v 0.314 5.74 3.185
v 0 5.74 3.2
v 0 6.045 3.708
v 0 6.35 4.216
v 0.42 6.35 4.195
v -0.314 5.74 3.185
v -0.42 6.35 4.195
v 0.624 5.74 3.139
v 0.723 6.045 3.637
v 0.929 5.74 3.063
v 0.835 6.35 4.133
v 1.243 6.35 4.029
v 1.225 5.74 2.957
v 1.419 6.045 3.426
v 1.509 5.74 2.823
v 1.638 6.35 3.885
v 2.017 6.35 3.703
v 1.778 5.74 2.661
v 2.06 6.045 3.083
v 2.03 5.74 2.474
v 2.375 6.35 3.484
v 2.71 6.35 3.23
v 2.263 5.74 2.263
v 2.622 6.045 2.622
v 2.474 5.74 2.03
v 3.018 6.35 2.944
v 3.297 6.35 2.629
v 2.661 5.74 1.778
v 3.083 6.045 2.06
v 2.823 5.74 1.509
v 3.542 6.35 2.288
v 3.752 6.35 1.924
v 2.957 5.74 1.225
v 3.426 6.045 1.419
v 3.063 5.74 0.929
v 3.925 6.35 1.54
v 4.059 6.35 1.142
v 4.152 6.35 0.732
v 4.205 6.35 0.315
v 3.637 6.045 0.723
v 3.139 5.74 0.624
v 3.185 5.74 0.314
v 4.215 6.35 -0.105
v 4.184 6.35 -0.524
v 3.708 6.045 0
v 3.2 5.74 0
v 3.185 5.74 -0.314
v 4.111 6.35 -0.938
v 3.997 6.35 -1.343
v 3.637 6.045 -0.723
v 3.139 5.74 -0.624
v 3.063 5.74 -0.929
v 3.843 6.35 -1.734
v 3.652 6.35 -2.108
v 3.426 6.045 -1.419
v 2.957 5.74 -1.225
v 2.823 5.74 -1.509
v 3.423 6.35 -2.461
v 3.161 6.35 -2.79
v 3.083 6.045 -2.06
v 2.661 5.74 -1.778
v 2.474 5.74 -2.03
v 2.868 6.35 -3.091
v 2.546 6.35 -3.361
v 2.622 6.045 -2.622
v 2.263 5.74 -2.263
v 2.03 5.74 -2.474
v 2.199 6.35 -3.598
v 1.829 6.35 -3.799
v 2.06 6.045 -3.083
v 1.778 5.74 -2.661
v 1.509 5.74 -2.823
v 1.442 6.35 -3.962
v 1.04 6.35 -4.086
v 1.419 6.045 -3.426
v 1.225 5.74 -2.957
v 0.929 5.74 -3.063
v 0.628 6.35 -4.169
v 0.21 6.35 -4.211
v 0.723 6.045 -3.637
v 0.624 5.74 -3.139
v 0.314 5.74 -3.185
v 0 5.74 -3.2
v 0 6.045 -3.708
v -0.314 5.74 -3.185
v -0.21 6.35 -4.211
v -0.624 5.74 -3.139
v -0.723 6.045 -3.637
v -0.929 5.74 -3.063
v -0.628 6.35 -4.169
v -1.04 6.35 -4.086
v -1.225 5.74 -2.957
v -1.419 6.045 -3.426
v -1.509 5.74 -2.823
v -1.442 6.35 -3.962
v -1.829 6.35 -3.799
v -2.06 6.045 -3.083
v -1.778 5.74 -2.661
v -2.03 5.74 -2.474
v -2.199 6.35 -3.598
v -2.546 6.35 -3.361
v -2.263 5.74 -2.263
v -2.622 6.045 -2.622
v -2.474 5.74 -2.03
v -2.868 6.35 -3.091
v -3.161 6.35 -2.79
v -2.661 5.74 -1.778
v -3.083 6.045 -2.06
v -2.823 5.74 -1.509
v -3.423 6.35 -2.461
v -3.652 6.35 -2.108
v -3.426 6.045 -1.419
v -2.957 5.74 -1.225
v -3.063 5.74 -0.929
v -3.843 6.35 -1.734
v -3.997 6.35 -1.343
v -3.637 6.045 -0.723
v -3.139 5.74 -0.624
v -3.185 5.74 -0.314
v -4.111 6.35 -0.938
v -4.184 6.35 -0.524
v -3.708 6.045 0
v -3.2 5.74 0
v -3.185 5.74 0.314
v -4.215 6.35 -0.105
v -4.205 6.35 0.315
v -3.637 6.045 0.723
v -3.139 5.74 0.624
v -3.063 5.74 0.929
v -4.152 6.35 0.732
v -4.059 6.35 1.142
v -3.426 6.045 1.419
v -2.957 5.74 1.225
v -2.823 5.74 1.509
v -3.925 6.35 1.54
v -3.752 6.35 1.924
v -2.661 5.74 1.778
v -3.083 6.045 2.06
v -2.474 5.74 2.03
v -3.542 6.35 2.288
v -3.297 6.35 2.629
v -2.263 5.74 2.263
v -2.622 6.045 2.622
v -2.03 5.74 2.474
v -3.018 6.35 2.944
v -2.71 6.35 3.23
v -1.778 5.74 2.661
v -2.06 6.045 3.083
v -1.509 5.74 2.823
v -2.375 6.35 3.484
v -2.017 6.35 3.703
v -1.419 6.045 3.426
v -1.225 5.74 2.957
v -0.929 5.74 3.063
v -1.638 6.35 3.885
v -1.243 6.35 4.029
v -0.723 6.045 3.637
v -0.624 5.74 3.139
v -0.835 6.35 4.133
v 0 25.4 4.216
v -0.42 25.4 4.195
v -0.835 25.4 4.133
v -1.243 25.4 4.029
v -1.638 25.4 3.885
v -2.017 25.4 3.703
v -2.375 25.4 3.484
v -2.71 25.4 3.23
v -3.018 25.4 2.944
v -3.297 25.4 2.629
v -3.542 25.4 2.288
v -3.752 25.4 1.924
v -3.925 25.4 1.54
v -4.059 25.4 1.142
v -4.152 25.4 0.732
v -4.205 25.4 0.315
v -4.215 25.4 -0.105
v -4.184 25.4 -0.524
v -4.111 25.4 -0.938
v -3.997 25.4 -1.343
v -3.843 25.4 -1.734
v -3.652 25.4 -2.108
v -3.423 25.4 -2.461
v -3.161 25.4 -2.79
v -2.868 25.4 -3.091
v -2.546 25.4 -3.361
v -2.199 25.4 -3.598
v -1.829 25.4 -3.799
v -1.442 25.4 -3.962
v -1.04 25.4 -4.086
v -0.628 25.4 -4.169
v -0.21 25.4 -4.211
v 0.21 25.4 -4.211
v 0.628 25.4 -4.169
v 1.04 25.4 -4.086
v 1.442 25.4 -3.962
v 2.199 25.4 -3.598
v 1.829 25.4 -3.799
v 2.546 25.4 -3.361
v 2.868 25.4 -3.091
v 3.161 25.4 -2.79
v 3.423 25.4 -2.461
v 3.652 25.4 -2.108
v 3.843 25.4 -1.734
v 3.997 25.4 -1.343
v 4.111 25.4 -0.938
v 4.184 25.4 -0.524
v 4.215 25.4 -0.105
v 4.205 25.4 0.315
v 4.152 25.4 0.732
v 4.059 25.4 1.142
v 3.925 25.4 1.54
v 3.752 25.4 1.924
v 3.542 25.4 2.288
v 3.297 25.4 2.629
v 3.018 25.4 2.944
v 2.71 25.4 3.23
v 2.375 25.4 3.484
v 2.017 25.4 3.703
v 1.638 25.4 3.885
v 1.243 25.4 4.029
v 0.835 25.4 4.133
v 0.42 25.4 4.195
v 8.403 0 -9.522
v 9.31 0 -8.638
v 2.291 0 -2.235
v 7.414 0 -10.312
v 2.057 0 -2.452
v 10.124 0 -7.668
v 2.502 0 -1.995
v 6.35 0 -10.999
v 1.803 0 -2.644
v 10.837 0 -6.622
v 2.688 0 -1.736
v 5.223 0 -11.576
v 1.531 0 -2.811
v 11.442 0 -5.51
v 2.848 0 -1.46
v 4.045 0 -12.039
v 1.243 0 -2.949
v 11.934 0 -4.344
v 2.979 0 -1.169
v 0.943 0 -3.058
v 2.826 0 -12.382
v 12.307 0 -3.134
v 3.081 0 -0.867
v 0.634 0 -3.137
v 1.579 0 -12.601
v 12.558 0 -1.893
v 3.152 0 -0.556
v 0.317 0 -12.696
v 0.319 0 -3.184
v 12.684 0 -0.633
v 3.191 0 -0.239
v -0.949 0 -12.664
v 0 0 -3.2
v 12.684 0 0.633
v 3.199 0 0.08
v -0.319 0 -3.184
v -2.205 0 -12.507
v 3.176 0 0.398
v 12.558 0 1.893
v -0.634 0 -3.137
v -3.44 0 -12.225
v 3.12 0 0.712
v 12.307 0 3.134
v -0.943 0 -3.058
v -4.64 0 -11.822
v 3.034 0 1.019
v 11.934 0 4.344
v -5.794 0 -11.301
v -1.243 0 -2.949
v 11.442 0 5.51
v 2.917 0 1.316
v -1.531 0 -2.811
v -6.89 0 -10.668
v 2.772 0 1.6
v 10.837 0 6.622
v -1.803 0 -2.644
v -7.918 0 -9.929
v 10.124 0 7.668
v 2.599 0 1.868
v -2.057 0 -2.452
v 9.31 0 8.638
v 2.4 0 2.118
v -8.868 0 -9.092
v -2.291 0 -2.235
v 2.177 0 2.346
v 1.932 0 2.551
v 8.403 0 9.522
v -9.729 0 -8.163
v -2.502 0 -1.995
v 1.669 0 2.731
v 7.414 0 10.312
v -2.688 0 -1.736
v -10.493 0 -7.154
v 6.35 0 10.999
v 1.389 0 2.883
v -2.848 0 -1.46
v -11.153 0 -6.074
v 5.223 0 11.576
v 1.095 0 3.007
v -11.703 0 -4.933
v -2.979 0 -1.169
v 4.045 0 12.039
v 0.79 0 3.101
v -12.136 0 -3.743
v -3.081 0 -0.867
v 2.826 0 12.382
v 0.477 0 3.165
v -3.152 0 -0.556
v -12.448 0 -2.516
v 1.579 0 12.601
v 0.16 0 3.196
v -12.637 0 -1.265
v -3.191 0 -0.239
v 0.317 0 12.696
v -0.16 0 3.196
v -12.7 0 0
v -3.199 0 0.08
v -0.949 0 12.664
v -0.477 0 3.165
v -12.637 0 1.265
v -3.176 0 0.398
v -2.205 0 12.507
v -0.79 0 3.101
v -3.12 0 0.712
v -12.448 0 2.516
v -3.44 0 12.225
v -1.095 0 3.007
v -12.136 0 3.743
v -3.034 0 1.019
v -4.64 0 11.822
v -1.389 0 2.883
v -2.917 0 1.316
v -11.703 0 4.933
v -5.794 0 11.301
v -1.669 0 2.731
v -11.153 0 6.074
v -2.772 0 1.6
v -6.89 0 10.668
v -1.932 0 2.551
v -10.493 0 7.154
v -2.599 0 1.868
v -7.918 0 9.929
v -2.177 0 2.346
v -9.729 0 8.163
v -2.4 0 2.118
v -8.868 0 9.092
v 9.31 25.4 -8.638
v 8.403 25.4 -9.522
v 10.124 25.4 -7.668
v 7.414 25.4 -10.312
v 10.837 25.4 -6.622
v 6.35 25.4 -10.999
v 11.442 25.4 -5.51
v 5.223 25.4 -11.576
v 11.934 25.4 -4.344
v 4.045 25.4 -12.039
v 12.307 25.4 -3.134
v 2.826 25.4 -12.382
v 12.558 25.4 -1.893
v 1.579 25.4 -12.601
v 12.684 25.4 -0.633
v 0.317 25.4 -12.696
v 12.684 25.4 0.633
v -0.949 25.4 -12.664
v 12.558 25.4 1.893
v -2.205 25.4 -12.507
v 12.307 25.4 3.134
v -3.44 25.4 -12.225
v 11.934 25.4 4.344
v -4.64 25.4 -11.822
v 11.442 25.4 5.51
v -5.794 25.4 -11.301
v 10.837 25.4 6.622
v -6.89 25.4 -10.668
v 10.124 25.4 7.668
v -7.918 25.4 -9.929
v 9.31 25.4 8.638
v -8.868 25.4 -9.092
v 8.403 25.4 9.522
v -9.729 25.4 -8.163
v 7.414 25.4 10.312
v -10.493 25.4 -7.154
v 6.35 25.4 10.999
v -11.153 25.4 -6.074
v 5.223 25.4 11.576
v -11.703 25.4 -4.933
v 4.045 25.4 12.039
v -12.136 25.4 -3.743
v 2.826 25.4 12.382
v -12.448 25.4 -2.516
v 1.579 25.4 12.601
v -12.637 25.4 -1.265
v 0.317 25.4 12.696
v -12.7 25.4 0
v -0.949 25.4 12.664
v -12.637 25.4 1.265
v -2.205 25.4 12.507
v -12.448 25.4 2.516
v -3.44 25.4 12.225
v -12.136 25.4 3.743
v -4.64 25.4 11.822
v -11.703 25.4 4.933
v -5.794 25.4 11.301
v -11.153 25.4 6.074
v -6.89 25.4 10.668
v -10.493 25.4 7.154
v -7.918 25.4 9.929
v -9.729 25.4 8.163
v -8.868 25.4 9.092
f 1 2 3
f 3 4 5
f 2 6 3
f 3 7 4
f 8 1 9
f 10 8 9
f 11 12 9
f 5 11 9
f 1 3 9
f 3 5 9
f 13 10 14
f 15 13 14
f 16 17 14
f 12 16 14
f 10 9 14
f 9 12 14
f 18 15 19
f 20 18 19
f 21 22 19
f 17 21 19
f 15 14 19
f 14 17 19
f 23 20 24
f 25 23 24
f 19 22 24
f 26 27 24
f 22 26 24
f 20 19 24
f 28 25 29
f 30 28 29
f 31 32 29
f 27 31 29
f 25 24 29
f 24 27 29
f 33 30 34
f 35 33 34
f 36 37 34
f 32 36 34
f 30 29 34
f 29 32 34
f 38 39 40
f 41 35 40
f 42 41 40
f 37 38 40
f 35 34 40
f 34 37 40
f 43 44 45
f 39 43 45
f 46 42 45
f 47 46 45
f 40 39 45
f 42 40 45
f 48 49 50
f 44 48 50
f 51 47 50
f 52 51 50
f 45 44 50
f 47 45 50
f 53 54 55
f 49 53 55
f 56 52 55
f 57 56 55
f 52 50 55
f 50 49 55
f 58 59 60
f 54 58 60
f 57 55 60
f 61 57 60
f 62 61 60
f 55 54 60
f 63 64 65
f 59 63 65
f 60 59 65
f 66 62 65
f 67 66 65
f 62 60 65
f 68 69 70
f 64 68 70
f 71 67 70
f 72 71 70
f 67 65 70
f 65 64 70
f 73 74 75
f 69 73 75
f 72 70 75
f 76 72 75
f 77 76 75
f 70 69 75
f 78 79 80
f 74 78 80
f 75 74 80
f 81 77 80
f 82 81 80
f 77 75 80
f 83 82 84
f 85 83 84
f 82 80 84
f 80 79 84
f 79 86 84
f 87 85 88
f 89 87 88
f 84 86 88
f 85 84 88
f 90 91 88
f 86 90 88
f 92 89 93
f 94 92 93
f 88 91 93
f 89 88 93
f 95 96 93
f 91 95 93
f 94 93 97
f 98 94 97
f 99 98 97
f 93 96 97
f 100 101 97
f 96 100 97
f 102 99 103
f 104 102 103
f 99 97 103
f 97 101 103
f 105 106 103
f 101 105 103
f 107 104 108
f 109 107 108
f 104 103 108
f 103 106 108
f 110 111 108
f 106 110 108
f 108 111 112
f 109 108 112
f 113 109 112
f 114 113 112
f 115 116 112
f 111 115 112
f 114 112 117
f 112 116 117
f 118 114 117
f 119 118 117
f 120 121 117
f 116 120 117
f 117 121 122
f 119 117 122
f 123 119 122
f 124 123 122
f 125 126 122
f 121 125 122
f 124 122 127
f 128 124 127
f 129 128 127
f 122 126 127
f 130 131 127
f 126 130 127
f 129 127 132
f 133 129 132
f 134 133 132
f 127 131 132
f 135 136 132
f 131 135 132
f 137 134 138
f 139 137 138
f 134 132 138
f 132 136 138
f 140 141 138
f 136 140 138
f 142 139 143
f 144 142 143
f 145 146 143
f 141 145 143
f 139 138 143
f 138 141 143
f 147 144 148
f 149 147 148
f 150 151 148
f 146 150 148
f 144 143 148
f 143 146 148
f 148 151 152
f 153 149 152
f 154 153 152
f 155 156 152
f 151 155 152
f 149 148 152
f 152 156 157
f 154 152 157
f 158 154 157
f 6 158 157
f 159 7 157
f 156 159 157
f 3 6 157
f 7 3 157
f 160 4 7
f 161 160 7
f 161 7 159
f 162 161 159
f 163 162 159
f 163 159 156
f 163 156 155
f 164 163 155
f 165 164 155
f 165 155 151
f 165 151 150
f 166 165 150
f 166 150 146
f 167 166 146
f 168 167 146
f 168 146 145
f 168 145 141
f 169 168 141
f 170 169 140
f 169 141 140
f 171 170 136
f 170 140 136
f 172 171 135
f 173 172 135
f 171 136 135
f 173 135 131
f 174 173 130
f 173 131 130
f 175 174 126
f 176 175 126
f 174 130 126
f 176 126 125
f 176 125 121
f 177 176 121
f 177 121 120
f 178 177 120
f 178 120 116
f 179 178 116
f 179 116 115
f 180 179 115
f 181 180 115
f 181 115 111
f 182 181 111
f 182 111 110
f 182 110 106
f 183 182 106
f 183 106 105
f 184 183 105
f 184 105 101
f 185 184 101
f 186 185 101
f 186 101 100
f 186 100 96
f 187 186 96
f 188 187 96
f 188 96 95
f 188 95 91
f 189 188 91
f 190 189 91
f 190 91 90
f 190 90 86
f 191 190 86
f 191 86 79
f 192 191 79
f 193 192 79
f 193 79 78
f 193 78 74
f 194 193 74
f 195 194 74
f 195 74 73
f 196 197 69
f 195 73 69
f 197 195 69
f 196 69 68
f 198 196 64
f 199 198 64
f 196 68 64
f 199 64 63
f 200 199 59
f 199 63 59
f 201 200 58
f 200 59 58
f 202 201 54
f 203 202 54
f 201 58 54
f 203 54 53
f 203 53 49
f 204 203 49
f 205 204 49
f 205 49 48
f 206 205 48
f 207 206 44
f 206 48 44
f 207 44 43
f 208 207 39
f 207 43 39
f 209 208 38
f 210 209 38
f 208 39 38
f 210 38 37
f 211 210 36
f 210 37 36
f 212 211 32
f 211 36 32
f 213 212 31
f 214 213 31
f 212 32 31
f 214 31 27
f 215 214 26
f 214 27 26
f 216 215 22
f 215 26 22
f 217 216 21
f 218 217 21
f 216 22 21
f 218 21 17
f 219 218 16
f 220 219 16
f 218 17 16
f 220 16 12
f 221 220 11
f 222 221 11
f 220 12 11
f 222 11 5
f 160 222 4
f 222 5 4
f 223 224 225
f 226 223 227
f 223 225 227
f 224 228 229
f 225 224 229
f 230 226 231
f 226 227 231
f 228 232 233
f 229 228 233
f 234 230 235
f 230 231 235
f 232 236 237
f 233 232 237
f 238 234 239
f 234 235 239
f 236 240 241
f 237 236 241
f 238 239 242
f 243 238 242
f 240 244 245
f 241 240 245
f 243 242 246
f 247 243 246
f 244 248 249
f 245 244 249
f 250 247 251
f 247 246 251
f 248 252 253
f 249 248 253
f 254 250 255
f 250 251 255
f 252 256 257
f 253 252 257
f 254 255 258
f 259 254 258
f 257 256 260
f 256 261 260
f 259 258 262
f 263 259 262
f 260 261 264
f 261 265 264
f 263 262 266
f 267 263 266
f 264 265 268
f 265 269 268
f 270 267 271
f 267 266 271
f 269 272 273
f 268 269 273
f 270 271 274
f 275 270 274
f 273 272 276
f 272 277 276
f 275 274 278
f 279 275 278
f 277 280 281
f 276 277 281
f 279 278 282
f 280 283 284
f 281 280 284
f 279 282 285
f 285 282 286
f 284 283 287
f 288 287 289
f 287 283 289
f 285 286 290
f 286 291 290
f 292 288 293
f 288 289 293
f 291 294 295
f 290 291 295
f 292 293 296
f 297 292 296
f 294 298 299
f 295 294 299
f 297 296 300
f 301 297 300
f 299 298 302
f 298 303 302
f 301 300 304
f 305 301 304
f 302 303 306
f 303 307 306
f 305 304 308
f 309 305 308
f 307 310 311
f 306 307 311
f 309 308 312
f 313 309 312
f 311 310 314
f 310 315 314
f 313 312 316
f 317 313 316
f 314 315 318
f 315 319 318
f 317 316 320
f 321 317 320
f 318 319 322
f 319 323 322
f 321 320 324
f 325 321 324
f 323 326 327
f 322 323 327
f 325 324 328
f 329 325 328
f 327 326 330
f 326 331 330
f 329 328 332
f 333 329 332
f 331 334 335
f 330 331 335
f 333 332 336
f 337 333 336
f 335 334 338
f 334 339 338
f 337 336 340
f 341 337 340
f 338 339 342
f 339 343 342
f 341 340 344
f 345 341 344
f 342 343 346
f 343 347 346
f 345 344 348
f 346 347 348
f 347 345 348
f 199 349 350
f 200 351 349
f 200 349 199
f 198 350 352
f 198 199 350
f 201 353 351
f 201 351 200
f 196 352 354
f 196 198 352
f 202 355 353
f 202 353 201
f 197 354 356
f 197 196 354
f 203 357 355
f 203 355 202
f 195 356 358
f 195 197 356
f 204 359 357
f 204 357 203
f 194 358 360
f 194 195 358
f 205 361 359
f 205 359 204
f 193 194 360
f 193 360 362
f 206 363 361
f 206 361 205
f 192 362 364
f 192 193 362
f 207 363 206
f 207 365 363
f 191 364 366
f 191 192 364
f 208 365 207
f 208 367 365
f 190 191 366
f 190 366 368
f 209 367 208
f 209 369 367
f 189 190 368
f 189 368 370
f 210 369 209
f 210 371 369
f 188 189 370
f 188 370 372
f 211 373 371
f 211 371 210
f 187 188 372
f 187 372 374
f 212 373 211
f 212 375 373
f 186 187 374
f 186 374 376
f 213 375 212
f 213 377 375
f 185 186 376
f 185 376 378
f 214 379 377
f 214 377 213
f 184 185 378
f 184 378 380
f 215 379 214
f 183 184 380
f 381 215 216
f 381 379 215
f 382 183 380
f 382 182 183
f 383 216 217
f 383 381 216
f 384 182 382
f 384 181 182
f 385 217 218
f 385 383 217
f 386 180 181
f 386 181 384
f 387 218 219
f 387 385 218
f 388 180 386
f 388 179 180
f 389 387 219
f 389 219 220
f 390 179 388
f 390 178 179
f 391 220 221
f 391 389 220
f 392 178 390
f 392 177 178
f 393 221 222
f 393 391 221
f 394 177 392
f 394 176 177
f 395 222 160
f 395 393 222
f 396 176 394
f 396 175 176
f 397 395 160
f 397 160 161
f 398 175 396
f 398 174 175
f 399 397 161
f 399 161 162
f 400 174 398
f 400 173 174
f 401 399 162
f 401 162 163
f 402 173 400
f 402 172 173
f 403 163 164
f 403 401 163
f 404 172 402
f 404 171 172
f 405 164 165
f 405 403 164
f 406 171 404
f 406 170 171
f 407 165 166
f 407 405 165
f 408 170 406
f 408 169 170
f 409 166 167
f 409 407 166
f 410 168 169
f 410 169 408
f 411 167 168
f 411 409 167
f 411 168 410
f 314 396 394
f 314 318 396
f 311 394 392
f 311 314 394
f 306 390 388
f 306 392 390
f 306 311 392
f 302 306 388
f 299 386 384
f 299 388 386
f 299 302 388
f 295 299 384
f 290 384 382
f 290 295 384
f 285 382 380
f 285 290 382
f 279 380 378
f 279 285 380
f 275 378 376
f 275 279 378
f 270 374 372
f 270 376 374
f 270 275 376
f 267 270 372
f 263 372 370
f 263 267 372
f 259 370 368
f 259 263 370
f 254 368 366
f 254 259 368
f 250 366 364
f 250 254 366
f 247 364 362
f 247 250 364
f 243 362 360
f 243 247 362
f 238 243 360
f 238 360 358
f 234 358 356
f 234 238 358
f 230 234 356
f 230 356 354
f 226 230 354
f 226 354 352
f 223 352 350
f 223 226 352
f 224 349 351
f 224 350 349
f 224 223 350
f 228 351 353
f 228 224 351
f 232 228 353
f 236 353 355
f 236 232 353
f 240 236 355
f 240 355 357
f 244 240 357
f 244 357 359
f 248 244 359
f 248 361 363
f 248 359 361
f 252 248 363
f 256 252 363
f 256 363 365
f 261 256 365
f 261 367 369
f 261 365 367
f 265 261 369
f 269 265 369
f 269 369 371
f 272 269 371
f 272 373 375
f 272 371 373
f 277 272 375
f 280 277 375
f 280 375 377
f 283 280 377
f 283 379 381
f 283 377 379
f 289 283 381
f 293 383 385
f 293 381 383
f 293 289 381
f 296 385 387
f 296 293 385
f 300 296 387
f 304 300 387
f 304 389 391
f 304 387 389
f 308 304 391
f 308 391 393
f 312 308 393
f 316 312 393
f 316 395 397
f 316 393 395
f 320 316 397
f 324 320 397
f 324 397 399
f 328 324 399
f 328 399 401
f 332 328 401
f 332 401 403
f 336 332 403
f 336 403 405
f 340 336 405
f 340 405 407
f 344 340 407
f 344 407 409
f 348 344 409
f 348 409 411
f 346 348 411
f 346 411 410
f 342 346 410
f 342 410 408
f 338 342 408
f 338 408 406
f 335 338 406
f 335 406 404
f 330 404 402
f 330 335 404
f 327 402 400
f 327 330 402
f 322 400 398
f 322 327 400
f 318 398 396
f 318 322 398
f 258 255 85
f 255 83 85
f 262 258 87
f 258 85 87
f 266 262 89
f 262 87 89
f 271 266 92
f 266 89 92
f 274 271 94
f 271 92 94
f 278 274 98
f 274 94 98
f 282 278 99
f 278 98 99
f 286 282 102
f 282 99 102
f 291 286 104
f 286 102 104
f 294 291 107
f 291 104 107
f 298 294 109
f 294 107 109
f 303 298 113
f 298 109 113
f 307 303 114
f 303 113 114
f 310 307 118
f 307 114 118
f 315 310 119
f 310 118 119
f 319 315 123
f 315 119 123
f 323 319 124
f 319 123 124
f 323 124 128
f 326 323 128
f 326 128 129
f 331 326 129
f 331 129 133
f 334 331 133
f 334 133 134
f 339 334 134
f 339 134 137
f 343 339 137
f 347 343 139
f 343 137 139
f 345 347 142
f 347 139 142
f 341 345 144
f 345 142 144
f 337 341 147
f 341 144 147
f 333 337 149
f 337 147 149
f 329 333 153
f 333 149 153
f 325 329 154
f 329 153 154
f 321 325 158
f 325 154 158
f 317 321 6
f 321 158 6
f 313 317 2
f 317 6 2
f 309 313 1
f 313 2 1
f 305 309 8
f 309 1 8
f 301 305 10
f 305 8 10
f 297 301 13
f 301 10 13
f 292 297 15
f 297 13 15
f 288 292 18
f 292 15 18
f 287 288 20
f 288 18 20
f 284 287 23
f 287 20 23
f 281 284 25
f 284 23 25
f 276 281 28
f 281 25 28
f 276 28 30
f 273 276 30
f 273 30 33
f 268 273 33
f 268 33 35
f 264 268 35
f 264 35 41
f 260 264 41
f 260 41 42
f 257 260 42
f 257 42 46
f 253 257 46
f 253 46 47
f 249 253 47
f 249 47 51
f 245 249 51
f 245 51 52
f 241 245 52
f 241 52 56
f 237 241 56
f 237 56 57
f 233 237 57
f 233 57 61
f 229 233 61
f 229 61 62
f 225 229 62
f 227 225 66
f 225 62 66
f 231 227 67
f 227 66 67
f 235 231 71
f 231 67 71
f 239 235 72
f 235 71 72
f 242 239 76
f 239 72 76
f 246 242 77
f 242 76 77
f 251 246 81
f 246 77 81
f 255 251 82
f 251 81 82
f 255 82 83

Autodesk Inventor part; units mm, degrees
ref_plane "YZ Plane" through (0, 0, 0) normal (1, 0, 0) x (0, 1, 0)
ref_plane "XZ Plane" through (0, 0, 0) normal (0, 1, 0) x (-1, 0, 0)
ref_plane "XY Plane" through (0, 0, 0) normal (0, 0, 1) x (1, 0, 0)
sketch "Sketch1" plane through (0, 0, 0) normal (0, 1, 0) x (-1, 0, 0)
  circle A0 centre (0, 0) radius 12.7
  dimension "d0" = 25.4
extrude "Extrusion1" add sketch "Sketch1" along normal blind 25.4
sketch "Sketch2" plane through (0, 25.4, 0) normal (0, 1, 0) x (1, 0, 0)
  circle A0 centre (0, 0) radius 2.4685
hole "Hole1" at (0, 25.4, 0) direction (0, -1, 0) diameter 8.4328 depth 19.05 tip angle 118 clearance for "Flat Head Machine Screw (82)" size "5/16" standard "Ansi Unified Screw Threads"
sketch "Sketch3" plane through (0, 0, 0) normal (0, -1, 0) x (1, 0, 0)
  circle A0 centre (0, 0) radius 4.2164 projected
  circle A1 centre (0, 0) radius 3.0691
hole "Hole2" at (0, 0, 0) direction (0, 1, 0) diameter 6.4008 depth 12.7 tip angle 118 thread size "5/16-18 UNC" class "2B" standard "ANSI Unified Screw Threads"
properties part number "spacer"
